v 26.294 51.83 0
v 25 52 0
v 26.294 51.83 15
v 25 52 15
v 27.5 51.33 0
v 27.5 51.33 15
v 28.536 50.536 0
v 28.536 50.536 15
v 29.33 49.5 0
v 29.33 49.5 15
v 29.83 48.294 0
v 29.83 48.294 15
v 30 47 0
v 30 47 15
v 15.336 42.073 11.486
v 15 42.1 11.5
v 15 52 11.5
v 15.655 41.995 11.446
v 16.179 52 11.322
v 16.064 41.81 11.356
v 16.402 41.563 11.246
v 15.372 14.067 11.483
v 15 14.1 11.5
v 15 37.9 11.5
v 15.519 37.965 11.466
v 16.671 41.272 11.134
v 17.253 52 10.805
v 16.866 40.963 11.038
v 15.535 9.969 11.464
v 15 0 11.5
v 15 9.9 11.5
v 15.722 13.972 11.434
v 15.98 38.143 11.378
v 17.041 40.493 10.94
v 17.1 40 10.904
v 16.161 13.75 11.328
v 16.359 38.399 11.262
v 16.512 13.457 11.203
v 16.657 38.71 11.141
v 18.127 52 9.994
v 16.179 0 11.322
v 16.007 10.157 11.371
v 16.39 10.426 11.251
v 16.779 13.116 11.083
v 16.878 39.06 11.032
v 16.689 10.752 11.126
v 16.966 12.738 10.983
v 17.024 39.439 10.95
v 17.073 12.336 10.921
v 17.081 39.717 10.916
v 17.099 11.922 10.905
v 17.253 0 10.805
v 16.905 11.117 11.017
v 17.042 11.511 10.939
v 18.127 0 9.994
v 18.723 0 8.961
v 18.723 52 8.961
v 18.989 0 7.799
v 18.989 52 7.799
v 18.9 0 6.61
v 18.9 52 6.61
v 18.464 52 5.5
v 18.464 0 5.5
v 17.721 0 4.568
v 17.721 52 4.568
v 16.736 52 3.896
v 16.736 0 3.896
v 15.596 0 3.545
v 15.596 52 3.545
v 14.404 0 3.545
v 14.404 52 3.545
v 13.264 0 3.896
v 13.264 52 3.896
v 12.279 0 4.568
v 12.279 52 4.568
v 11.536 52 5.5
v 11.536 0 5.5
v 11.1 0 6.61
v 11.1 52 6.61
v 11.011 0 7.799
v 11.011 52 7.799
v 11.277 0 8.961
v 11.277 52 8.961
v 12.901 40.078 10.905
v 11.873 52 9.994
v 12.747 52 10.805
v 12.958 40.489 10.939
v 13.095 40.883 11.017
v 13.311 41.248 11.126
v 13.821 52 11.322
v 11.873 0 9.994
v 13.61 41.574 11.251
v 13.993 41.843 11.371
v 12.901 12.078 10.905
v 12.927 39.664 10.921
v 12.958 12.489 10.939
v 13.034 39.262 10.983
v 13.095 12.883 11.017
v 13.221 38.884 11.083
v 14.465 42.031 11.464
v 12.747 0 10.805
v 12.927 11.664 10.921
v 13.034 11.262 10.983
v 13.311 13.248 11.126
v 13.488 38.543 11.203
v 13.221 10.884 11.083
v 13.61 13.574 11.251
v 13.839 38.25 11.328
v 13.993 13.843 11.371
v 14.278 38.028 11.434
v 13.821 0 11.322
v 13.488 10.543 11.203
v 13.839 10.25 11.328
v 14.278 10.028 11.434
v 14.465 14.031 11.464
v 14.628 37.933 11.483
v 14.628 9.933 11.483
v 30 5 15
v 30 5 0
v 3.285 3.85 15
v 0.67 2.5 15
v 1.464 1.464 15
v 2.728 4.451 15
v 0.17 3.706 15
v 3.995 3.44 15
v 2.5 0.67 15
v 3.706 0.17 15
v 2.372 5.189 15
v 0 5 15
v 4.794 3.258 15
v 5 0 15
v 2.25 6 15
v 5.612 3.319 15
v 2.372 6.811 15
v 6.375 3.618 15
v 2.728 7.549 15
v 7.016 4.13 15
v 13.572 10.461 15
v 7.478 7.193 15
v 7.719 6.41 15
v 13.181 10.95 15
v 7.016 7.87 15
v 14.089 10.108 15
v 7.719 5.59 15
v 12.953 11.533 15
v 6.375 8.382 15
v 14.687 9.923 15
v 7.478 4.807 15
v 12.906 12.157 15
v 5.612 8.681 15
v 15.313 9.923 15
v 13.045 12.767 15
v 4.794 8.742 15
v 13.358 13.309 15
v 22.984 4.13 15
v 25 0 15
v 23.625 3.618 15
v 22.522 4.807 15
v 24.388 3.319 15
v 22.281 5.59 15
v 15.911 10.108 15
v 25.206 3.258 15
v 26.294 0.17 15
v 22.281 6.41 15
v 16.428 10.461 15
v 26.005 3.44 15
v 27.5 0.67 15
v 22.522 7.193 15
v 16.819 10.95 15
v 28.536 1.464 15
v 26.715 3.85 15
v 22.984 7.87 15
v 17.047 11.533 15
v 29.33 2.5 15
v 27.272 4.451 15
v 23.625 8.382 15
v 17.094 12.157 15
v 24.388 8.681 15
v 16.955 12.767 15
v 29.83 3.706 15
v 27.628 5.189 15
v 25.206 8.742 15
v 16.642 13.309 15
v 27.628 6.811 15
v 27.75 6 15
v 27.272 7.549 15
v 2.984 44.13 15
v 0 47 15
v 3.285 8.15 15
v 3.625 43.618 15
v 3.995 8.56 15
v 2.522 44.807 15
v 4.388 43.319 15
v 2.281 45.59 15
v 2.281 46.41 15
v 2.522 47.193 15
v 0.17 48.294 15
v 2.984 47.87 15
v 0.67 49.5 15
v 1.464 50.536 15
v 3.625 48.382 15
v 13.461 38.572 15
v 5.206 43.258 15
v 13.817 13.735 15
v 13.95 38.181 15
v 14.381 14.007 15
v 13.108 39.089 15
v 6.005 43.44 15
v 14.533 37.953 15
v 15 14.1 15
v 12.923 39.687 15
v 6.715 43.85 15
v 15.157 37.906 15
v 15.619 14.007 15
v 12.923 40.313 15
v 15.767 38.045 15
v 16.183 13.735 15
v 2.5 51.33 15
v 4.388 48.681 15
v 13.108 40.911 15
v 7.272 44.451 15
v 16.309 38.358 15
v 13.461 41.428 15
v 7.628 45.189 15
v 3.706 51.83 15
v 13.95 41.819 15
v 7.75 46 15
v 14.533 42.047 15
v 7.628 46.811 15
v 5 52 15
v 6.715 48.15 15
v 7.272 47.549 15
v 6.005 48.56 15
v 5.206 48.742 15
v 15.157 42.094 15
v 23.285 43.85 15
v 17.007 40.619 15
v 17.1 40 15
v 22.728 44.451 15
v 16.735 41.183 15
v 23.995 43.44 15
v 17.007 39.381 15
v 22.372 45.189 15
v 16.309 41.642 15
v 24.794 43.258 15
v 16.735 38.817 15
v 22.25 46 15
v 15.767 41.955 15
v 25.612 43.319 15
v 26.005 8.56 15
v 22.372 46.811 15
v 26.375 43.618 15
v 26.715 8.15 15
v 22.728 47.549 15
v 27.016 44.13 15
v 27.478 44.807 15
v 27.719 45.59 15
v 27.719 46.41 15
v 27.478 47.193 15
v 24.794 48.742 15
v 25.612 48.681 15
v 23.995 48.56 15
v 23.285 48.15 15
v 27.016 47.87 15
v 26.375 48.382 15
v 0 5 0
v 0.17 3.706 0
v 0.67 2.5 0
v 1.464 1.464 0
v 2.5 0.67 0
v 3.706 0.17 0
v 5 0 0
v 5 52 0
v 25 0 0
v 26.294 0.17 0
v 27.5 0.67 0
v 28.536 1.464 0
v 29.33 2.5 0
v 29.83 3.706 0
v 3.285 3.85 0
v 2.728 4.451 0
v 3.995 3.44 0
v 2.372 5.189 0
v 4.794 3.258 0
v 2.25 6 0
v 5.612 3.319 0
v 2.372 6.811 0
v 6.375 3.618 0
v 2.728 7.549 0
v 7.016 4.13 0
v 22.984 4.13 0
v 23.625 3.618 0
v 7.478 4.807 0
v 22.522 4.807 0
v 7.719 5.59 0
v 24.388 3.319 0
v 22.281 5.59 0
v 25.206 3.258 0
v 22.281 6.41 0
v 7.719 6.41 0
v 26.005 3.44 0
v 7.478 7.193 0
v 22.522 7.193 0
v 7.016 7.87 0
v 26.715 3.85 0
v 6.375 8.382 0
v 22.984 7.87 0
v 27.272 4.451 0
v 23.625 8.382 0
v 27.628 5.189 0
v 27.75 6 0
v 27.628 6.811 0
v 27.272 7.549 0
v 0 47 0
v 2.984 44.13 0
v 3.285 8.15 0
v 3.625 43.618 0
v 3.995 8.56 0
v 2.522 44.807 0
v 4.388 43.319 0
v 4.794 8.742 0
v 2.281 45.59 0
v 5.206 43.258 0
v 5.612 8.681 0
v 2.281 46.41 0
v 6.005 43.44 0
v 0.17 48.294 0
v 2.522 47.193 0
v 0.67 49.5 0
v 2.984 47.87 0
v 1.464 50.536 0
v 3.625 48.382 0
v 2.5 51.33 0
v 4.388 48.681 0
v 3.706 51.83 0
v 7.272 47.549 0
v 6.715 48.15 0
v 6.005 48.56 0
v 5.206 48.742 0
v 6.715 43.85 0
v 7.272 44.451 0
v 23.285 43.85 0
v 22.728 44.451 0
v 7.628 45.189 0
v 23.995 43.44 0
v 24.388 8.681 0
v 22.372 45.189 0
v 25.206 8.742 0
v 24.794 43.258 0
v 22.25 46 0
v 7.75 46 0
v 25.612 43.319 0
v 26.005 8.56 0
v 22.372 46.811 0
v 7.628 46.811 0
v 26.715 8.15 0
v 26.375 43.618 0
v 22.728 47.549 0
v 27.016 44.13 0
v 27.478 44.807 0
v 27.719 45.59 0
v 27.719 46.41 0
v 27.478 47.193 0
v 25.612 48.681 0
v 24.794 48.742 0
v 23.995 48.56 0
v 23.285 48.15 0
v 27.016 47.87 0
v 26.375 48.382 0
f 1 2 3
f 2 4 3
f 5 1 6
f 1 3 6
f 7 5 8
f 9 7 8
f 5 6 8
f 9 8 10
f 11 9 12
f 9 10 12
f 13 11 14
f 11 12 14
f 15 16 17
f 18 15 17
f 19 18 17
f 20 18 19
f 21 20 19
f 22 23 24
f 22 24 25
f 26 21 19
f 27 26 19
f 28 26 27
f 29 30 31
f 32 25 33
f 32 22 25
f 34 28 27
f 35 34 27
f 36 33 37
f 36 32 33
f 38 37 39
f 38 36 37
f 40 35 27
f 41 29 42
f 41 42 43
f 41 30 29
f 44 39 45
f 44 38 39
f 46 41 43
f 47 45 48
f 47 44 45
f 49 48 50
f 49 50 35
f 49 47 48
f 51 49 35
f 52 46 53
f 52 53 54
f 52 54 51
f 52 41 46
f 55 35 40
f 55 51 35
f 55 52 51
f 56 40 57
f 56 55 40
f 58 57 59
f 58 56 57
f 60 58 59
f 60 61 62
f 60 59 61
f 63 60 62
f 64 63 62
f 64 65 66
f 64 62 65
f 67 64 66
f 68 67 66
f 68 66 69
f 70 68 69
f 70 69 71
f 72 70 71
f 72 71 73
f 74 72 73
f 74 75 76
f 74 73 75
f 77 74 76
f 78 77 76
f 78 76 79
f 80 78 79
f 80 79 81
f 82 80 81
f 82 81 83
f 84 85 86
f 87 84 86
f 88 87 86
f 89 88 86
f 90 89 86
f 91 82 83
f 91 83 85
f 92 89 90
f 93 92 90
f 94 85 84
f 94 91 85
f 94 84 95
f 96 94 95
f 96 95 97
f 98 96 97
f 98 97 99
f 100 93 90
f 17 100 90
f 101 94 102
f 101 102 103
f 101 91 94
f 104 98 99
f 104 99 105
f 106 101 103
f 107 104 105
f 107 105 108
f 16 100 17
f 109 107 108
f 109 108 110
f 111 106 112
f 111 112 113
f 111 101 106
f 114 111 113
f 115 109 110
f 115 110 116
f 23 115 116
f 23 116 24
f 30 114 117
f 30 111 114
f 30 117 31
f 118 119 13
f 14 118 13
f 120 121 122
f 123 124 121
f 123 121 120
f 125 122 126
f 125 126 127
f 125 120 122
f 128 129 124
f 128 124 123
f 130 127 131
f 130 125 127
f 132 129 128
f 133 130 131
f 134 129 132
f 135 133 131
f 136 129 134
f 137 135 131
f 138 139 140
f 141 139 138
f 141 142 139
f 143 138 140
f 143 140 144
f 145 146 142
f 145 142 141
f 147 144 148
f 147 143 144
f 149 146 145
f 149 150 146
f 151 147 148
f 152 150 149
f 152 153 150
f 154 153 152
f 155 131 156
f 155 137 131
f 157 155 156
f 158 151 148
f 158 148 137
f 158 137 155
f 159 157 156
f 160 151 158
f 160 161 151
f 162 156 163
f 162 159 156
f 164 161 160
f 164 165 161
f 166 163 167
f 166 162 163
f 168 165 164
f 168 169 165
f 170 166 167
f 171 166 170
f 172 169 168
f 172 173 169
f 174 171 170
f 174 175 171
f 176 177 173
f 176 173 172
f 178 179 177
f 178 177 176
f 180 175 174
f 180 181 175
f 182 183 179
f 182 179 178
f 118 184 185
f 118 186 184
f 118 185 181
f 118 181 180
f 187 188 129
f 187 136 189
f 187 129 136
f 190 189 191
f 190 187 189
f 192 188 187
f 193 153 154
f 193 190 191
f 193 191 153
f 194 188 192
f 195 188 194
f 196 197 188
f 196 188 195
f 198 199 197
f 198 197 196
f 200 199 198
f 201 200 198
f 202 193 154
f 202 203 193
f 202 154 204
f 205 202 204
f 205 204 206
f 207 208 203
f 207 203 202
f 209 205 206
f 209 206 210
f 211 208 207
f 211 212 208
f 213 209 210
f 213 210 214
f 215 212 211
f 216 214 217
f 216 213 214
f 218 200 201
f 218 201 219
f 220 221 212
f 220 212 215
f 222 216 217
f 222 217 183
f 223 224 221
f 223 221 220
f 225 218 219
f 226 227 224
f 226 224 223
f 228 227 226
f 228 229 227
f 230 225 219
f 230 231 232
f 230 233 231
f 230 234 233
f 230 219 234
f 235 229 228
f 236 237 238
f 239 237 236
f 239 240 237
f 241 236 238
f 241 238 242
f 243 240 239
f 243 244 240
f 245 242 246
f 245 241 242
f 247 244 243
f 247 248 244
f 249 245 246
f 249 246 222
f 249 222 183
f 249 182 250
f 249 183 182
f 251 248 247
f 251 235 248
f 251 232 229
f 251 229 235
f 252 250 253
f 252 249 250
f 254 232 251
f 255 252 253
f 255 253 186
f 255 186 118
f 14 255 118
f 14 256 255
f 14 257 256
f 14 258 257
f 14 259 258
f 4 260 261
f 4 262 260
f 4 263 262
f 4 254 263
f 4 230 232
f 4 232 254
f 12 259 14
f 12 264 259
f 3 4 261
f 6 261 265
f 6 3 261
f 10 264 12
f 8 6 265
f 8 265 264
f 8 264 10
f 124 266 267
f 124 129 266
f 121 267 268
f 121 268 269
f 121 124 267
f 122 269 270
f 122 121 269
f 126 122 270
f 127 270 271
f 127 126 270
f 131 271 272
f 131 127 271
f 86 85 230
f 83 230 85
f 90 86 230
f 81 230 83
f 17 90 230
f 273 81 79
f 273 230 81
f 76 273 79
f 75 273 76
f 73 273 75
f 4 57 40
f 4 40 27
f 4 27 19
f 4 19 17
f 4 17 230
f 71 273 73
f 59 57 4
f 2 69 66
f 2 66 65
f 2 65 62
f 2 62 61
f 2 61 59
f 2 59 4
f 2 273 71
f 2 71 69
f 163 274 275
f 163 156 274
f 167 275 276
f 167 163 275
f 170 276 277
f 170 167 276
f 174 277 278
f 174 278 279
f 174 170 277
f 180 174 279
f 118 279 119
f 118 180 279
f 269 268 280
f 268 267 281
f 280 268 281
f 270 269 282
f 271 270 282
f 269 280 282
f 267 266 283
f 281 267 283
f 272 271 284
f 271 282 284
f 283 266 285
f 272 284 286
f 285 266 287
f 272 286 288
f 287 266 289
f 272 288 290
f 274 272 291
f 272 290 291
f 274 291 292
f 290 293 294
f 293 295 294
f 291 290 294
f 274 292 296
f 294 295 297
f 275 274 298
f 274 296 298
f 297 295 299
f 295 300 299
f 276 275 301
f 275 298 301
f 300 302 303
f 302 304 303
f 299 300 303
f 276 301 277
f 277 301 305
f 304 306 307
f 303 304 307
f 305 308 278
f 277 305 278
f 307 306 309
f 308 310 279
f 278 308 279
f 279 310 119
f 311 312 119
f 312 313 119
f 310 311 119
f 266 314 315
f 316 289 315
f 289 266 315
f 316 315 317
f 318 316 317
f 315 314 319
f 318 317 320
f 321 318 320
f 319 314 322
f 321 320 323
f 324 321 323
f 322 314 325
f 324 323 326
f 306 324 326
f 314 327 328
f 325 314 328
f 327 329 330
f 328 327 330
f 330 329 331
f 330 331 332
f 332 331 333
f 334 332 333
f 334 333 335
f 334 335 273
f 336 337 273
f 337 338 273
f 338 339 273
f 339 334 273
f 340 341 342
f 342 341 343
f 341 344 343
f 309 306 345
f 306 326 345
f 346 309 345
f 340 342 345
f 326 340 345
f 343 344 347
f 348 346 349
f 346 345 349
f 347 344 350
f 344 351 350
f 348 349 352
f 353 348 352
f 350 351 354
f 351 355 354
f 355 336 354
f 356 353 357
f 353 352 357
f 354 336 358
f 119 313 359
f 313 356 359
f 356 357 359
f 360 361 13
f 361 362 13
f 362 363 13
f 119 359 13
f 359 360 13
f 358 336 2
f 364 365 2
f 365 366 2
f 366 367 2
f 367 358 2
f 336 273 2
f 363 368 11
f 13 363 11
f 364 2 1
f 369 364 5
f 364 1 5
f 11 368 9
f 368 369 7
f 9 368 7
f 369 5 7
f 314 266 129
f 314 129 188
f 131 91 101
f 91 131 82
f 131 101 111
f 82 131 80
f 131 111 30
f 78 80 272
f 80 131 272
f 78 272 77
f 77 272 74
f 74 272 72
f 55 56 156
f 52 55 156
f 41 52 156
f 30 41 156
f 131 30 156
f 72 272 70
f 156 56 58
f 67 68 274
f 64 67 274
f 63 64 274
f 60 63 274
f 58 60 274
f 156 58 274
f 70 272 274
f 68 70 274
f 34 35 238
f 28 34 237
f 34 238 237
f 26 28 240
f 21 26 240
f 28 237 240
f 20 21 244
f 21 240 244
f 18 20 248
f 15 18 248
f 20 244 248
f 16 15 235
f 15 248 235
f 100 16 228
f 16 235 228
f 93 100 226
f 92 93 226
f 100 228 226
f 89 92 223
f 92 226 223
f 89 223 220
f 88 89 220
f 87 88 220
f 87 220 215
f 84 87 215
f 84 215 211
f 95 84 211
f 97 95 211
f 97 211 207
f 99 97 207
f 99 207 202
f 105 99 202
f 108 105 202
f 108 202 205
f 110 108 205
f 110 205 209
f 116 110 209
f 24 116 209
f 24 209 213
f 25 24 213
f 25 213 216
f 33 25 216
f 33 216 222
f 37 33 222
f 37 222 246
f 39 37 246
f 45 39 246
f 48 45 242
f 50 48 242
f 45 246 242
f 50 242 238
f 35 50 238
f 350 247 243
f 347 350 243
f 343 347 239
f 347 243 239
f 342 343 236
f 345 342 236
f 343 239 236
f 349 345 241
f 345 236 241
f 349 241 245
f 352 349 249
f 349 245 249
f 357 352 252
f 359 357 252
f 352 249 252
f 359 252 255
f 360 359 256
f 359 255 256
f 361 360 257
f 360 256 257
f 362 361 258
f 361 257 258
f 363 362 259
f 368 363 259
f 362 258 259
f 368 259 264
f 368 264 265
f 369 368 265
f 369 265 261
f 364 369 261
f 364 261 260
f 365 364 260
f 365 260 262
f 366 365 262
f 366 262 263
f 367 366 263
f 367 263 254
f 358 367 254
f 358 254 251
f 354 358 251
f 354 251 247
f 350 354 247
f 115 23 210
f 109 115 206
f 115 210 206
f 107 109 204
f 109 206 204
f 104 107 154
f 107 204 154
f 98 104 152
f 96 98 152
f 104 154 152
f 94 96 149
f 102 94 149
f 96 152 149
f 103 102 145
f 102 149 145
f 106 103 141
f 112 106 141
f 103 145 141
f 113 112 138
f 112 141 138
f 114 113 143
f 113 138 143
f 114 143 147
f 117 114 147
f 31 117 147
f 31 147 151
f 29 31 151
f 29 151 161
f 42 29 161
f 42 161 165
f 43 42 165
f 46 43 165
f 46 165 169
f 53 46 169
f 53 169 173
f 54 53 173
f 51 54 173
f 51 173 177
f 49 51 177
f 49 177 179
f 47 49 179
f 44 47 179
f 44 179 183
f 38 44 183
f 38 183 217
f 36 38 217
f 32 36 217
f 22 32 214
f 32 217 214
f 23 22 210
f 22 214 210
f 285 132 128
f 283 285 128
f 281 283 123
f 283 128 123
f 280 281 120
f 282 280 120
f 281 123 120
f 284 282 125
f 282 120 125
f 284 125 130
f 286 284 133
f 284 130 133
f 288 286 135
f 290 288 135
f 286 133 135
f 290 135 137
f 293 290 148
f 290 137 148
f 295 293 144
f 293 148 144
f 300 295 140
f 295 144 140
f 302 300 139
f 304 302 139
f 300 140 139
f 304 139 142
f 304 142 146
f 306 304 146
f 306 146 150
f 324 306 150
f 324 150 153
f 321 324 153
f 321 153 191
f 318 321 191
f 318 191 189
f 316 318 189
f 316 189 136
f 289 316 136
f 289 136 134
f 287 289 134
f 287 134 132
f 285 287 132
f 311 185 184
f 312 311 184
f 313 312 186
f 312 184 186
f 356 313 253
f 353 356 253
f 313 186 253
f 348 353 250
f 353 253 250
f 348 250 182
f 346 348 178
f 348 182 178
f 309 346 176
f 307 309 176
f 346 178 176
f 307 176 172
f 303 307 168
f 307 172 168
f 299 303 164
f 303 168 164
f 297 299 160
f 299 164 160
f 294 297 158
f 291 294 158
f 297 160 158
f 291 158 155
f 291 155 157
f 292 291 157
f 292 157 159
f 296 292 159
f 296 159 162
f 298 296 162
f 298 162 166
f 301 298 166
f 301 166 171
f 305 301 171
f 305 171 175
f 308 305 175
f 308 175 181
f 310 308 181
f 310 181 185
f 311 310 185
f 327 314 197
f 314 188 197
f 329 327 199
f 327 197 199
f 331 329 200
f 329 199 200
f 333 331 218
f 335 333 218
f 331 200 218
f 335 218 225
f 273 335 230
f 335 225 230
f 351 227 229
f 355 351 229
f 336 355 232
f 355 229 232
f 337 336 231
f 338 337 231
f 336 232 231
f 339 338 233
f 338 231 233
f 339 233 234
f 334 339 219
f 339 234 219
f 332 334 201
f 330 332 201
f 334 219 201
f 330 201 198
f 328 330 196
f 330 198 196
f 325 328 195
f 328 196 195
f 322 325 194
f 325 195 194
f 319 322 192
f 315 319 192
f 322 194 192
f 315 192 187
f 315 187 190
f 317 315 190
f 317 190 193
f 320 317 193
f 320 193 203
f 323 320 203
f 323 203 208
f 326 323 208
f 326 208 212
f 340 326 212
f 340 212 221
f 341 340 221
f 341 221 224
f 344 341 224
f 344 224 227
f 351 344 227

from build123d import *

# Parameters (mm, degrees)
ESQUISSE1_W                  = 30
ESQUISSE1_H                  = 52
BOSS_EXTRU_1_DEPTH           = 15
ENL_V_MAT_EXTRU_1_DEPTH      = 62.878914018
ENL_V_MAT_EXTRU_1_DEPTH_BACK = 62.878914018
ESQUISSE2_R                  = 4
ESQUISSE3_R                  = 2.75
ENL_V_MAT_EXTRU_2_DEPTH      = 62.878914018
CONG_1_R                     = 5
ESQUISSE4_R                  = 2.1
ENL_V_MAT_EXTRU_3_DEPTH      = 10


with BuildPart() as part:
    # Esquisse1 → Boss.-Extru.1 (new body)
    with BuildSketch(Plane.XY):
        with Locations((15, 26)):
            Rectangle(ESQUISSE1_W, ESQUISSE1_H)
    extrude(amount=BOSS_EXTRU_1_DEPTH)

    # Esquisse2 → Enlèv. mat.-Extru.1 (cut, two sides: drawn at the far end of the back side and taken through both)
    with BuildSketch(Plane(origin=(0, 52, 0), x_dir=(1, 0, 0), z_dir=(0, 1, 0)).offset(-ENL_V_MAT_EXTRU_1_DEPTH_BACK)):
        with Locations(Location((15, -7.5, 0), (0, 0, 270))):
            Circle(ESQUISSE2_R)
    extrude(amount=ENL_V_MAT_EXTRU_1_DEPTH + ENL_V_MAT_EXTRU_1_DEPTH_BACK, mode=Mode.SUBTRACT)

    # Esquisse3 → Enlèv. mat.-Extru.2 (cut, through all)
    with BuildSketch(Plane.XY.offset(15)):
        with Locations((5, 46)):
            Circle(ESQUISSE3_R)
        with Locations(Location((25, 46, 0), (0, 0, 180))):
            Circle(ESQUISSE3_R)
        with Locations((25, 6)):
            Circle(ESQUISSE3_R)
        with Locations(Location((5, 6, 0), (0, 0, 180))):
            Circle(ESQUISSE3_R)
    extrude(amount=-ENL_V_MAT_EXTRU_2_DEPTH, mode=Mode.SUBTRACT)

    # Congé1
    cong_1_edges = [part.edges().sort_by_distance(p)[0] for p in [
        (0, 52, 7.5),
        (30, 52, 7.5),
        (30, 0, 7.5),
        (0, 0, 7.5),
    ]]
    fillet(cong_1_edges, radius=CONG_1_R)

    # Esquisse4 → Enlèv. mat.-Extru.3 (cut)
    with BuildSketch(Plane.XY.offset(15)):
        with Locations((15, 40)):
            Circle(ESQUISSE4_R)
        with Locations(Location((15, 12, 0), (0, 0, 89.999999995))):
            Circle(ESQUISSE4_R)
    extrude(amount=-ENL_V_MAT_EXTRU_3_DEPTH, mode=Mode.SUBTRACT)


solid = part.part
